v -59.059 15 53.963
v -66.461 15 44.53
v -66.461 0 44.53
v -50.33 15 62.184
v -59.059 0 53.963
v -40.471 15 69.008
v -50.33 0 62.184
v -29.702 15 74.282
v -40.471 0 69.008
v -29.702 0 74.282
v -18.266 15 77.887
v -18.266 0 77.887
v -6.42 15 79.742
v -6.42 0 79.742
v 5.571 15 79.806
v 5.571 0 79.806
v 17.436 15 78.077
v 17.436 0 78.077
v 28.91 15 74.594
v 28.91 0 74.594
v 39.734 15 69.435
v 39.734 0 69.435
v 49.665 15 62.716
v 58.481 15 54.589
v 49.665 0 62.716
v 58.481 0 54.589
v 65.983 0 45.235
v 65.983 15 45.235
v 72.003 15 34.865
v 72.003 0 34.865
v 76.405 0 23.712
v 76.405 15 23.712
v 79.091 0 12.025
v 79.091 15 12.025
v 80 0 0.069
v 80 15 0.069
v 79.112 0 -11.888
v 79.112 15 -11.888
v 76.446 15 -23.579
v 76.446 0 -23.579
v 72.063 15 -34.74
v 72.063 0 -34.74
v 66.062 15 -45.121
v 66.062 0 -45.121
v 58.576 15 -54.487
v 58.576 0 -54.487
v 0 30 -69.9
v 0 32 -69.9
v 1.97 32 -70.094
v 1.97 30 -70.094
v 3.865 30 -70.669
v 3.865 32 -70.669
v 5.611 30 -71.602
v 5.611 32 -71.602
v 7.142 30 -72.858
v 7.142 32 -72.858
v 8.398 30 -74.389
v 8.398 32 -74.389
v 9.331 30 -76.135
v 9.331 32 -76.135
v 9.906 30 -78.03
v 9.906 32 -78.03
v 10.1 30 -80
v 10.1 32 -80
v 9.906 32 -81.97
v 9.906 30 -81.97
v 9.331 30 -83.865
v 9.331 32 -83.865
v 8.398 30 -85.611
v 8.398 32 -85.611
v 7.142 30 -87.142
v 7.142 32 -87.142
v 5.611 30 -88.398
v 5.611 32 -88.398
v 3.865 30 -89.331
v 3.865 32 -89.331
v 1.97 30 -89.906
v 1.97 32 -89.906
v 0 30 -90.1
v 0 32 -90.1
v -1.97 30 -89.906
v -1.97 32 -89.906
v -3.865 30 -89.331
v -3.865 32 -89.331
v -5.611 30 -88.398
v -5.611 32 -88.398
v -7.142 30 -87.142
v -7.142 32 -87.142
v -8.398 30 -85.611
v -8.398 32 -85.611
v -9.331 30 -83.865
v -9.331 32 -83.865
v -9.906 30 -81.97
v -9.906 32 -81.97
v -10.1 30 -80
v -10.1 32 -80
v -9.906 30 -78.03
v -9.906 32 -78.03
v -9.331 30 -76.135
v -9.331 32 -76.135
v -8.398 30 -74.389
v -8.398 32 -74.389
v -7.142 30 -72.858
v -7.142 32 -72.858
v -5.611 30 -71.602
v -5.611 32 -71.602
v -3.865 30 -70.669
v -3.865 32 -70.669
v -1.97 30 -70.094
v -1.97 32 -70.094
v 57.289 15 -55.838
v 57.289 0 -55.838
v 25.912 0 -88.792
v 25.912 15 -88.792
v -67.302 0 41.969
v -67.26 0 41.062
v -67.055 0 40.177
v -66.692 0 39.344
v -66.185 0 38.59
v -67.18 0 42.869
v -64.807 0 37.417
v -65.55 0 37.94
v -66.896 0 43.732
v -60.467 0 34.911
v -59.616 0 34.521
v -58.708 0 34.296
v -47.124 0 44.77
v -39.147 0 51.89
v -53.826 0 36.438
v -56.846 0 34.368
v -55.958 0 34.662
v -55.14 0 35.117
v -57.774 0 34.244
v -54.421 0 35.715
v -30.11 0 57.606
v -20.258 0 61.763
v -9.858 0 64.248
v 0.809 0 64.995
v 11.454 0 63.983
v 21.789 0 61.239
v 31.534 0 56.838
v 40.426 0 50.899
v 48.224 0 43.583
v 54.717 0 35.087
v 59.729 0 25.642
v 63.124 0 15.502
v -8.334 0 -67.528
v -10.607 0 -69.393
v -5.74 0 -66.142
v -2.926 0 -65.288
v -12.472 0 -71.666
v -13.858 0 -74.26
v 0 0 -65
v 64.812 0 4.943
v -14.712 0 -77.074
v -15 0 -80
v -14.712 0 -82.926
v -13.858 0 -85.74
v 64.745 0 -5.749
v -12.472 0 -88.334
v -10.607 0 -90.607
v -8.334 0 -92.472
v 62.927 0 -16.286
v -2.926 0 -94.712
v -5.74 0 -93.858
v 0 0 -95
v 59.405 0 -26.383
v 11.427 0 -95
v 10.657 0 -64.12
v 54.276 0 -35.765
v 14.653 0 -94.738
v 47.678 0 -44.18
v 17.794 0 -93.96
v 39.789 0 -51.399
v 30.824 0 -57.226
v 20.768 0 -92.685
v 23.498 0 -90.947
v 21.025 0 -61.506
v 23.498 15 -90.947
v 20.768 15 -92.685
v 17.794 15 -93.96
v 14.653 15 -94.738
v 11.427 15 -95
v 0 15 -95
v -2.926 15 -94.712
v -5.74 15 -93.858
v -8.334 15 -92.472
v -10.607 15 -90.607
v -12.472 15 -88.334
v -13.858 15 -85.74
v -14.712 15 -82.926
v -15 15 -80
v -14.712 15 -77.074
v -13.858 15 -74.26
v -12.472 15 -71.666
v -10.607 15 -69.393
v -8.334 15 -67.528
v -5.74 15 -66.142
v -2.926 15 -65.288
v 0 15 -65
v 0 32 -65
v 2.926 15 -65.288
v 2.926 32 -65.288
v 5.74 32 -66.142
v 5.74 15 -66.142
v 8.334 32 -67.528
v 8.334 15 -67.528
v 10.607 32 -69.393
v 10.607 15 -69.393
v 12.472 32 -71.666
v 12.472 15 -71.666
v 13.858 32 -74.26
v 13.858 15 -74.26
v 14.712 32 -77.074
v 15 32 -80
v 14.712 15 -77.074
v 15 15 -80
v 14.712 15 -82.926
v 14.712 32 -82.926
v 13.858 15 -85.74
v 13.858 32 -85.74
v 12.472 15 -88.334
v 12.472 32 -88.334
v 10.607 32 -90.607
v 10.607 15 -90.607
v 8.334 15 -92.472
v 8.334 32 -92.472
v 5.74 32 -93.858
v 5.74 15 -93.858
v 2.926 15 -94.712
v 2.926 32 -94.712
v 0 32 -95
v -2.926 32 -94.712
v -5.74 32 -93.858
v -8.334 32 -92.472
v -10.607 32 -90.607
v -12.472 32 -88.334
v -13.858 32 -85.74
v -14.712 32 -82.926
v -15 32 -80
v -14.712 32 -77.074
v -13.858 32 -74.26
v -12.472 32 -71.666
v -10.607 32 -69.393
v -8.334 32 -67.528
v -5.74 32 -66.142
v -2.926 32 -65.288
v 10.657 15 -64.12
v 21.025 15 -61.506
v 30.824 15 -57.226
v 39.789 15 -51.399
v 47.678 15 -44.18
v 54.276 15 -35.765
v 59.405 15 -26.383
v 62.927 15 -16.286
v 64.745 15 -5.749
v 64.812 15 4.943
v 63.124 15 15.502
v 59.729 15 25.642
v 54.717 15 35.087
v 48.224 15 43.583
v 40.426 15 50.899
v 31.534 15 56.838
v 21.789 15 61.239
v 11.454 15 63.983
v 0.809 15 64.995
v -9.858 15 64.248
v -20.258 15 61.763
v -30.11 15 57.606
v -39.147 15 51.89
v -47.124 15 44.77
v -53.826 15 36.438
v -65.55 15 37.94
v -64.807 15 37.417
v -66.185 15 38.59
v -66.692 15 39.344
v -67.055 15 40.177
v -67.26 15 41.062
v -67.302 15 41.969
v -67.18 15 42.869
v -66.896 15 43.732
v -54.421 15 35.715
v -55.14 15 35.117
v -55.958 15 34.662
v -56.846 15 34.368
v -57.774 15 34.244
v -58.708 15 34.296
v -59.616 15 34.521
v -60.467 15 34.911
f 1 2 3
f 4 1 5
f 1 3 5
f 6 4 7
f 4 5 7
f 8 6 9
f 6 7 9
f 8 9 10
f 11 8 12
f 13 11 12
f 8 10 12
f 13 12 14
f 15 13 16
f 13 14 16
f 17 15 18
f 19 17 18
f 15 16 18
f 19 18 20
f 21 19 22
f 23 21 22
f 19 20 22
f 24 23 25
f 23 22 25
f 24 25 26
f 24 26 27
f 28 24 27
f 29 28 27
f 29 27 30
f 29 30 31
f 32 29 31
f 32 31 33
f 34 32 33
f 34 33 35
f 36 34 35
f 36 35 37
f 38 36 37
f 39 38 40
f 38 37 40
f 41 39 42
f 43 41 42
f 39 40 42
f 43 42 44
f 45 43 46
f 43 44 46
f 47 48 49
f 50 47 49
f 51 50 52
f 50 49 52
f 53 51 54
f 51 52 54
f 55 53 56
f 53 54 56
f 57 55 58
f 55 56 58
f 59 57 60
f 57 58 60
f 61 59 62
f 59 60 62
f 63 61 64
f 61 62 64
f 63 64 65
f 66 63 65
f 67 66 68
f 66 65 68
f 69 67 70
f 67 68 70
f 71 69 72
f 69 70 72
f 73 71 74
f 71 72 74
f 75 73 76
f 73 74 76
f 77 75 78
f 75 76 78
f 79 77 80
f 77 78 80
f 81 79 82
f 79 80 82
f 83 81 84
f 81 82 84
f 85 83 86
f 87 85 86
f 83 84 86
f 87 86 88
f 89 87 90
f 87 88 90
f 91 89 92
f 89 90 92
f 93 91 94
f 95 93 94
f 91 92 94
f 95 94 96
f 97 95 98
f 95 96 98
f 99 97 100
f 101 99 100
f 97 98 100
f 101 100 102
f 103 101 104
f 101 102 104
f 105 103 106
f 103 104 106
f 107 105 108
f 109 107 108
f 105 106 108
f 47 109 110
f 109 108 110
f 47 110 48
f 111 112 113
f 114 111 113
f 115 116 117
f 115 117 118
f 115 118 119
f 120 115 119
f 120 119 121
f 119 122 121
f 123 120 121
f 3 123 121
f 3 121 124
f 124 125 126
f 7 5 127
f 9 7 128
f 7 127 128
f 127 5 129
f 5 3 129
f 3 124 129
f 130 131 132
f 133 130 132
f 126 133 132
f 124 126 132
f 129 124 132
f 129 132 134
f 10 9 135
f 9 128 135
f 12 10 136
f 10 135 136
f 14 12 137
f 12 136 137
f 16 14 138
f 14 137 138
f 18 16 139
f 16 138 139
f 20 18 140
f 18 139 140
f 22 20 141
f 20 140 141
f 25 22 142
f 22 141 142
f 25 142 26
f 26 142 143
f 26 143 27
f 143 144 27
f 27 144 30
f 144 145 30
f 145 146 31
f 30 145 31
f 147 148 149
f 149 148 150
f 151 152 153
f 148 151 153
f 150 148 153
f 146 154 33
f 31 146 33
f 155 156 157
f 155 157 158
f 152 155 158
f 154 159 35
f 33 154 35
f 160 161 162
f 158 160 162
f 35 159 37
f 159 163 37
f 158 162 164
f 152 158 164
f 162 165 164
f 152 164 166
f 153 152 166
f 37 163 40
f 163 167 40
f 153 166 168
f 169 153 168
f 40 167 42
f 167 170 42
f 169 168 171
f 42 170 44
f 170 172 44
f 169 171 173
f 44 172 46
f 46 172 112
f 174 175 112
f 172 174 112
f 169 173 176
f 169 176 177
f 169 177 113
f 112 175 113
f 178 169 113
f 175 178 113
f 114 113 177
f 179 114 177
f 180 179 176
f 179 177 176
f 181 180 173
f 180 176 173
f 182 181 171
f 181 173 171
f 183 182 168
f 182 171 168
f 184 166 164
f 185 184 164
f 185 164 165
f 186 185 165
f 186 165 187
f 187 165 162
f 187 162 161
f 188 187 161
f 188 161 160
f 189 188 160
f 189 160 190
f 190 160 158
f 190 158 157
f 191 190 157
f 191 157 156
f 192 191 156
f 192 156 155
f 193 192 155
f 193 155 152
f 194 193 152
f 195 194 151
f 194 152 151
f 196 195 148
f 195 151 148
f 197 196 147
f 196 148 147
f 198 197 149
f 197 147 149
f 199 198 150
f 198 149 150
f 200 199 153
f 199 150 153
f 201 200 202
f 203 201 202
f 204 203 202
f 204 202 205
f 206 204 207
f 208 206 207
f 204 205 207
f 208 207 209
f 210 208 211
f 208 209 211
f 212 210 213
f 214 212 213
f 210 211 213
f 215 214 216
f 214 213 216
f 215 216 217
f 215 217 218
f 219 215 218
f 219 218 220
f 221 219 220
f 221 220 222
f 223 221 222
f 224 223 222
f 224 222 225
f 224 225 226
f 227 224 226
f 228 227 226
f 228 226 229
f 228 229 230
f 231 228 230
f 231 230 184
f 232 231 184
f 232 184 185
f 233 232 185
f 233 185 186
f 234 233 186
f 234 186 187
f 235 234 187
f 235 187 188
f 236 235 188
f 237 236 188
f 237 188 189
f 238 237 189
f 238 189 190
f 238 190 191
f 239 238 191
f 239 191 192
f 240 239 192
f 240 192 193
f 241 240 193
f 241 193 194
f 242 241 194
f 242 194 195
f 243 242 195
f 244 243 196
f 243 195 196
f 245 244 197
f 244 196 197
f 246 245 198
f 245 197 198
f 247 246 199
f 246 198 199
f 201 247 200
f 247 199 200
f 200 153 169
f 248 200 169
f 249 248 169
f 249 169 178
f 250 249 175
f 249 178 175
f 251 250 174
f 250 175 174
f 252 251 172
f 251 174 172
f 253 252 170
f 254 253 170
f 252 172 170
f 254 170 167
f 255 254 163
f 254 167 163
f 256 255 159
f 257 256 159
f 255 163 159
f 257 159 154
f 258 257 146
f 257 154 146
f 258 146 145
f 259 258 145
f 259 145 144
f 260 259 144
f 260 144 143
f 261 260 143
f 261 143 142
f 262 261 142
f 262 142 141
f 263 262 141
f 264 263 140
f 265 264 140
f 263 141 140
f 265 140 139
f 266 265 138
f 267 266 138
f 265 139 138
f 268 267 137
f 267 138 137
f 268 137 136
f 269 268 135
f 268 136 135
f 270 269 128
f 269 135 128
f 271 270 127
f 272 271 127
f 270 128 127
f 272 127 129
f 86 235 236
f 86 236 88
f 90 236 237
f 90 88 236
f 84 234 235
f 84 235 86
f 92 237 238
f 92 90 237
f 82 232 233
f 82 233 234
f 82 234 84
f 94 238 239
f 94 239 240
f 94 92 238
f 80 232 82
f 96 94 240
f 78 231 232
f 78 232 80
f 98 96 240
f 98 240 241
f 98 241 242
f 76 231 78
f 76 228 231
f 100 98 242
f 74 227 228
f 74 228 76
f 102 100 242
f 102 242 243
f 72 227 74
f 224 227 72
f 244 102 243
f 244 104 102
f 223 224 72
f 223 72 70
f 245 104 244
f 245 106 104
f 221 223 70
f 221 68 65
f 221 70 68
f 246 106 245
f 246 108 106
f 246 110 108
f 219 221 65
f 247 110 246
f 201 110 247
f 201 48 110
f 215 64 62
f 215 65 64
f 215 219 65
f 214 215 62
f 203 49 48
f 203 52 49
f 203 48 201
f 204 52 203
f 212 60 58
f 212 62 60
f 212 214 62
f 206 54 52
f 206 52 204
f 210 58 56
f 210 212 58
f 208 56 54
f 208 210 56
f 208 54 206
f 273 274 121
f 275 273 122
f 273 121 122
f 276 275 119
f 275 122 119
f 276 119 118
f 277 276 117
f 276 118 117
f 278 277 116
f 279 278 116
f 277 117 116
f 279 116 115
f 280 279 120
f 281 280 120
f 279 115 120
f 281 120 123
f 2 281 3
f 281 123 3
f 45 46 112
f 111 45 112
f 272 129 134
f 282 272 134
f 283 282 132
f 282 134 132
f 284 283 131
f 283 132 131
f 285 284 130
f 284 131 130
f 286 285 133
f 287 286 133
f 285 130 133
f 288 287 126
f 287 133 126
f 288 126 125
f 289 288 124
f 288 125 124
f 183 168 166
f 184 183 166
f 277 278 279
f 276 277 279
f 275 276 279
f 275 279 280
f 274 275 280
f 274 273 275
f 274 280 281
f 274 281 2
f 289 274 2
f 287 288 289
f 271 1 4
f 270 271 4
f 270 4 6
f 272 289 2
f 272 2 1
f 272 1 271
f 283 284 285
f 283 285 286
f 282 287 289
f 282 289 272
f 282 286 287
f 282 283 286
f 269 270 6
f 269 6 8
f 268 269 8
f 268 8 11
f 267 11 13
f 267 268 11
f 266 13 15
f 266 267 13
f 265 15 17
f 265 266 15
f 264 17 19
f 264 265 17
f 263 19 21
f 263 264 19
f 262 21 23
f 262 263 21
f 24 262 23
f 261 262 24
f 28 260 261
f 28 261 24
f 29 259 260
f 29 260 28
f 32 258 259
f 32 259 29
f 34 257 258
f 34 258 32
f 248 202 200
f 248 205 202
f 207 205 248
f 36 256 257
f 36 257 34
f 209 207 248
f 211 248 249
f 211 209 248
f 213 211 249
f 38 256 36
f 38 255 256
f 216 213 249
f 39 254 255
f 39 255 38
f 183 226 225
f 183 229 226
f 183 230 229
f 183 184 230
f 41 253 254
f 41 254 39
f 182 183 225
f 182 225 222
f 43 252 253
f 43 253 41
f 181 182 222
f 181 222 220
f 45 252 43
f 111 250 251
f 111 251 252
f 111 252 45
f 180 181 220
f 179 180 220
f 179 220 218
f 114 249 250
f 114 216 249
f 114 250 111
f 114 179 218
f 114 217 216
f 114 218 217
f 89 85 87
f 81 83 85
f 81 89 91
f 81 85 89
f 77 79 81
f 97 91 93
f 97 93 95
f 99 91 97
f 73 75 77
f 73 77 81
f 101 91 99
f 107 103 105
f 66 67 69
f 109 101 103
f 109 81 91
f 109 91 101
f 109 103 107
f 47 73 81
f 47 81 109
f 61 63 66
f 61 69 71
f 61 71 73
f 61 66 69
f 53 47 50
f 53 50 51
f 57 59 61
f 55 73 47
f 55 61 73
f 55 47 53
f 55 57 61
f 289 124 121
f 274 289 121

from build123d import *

# Parameters (mm, degrees)
EXTRUDE_4_DEPTH     = 15
SKETCH_4_R          = 15
EXTRUDE_5_DEPTH     = 17
SKETCH_6_R          = 10.1
CUT_EXTRUDE_1_DEPTH = 2


with BuildPart() as part:
    # ｽｹｯﾁ2 → ﾎﾞｽ - 押し出し4 (new body)
    with BuildSketch(Plane(origin=(0, 0, 0), x_dir=(1, 0, 0), z_dir=(0, 1, 0))):
        with BuildLine():
            ThreePointArc((-53.82643789, -36.437818048), (-56.846261527, -34.367935813), (-60.466933112, -34.910600109))
            Line((-60.466933112, -34.910600109), (-64.807406984, -37.416573868))
            ThreePointArc((-64.807406984, -37.416573868), (-67.177509772, -40.614402853), (-66.461234116, -44.529814279))
            ThreePointArc((-66.461234116, -44.529814279), (49.665387485, -62.716419588), (58.57572973, 54.487465409))
            Line((58.57572973, 54.487465409), (57.289371136, 55.838409315))
            Line((57.289371136, 55.838409315), (25.911523347, 88.791671712))
            ThreePointArc((25.911523347, 88.791671712), (19.306695871, 93.382511176), (11.427401304, 95))
            Line((11.427401304, 95), (0, 95))
            ThreePointArc((0, 95), (-15, 80), (0, 65))
            ThreePointArc((0, 65), (57.41714976, -30.467538684), (-53.82643789, -36.437818048))
        make_face()
    extrude(amount=EXTRUDE_4_DEPTH)

    # ｽｹｯﾁ4 → ﾎﾞｽ - 押し出し5 (add)
    with BuildSketch(Plane(origin=(0, 15, 0), x_dir=(1, 0, 0), z_dir=(0, 1, 0))):
        with Locations(Location((0, 80, 0), (0, 0, 270))):
            Circle(SKETCH_4_R)
    extrude(amount=EXTRUDE_5_DEPTH)

    # ｽｹｯﾁ6 → ｶｯﾄ - 押し出し1 (cut)
    with BuildSketch(Plane(origin=(0, 32, 0), x_dir=(1, 0, 0), z_dir=(0, 1, 0))):
        with Locations(Location((0, 80, 0), (0, 0, 270))):
            Circle(SKETCH_6_R)
    extrude(amount=-CUT_EXTRUDE_1_DEPTH, mode=Mode.SUBTRACT)


solid = part.part
